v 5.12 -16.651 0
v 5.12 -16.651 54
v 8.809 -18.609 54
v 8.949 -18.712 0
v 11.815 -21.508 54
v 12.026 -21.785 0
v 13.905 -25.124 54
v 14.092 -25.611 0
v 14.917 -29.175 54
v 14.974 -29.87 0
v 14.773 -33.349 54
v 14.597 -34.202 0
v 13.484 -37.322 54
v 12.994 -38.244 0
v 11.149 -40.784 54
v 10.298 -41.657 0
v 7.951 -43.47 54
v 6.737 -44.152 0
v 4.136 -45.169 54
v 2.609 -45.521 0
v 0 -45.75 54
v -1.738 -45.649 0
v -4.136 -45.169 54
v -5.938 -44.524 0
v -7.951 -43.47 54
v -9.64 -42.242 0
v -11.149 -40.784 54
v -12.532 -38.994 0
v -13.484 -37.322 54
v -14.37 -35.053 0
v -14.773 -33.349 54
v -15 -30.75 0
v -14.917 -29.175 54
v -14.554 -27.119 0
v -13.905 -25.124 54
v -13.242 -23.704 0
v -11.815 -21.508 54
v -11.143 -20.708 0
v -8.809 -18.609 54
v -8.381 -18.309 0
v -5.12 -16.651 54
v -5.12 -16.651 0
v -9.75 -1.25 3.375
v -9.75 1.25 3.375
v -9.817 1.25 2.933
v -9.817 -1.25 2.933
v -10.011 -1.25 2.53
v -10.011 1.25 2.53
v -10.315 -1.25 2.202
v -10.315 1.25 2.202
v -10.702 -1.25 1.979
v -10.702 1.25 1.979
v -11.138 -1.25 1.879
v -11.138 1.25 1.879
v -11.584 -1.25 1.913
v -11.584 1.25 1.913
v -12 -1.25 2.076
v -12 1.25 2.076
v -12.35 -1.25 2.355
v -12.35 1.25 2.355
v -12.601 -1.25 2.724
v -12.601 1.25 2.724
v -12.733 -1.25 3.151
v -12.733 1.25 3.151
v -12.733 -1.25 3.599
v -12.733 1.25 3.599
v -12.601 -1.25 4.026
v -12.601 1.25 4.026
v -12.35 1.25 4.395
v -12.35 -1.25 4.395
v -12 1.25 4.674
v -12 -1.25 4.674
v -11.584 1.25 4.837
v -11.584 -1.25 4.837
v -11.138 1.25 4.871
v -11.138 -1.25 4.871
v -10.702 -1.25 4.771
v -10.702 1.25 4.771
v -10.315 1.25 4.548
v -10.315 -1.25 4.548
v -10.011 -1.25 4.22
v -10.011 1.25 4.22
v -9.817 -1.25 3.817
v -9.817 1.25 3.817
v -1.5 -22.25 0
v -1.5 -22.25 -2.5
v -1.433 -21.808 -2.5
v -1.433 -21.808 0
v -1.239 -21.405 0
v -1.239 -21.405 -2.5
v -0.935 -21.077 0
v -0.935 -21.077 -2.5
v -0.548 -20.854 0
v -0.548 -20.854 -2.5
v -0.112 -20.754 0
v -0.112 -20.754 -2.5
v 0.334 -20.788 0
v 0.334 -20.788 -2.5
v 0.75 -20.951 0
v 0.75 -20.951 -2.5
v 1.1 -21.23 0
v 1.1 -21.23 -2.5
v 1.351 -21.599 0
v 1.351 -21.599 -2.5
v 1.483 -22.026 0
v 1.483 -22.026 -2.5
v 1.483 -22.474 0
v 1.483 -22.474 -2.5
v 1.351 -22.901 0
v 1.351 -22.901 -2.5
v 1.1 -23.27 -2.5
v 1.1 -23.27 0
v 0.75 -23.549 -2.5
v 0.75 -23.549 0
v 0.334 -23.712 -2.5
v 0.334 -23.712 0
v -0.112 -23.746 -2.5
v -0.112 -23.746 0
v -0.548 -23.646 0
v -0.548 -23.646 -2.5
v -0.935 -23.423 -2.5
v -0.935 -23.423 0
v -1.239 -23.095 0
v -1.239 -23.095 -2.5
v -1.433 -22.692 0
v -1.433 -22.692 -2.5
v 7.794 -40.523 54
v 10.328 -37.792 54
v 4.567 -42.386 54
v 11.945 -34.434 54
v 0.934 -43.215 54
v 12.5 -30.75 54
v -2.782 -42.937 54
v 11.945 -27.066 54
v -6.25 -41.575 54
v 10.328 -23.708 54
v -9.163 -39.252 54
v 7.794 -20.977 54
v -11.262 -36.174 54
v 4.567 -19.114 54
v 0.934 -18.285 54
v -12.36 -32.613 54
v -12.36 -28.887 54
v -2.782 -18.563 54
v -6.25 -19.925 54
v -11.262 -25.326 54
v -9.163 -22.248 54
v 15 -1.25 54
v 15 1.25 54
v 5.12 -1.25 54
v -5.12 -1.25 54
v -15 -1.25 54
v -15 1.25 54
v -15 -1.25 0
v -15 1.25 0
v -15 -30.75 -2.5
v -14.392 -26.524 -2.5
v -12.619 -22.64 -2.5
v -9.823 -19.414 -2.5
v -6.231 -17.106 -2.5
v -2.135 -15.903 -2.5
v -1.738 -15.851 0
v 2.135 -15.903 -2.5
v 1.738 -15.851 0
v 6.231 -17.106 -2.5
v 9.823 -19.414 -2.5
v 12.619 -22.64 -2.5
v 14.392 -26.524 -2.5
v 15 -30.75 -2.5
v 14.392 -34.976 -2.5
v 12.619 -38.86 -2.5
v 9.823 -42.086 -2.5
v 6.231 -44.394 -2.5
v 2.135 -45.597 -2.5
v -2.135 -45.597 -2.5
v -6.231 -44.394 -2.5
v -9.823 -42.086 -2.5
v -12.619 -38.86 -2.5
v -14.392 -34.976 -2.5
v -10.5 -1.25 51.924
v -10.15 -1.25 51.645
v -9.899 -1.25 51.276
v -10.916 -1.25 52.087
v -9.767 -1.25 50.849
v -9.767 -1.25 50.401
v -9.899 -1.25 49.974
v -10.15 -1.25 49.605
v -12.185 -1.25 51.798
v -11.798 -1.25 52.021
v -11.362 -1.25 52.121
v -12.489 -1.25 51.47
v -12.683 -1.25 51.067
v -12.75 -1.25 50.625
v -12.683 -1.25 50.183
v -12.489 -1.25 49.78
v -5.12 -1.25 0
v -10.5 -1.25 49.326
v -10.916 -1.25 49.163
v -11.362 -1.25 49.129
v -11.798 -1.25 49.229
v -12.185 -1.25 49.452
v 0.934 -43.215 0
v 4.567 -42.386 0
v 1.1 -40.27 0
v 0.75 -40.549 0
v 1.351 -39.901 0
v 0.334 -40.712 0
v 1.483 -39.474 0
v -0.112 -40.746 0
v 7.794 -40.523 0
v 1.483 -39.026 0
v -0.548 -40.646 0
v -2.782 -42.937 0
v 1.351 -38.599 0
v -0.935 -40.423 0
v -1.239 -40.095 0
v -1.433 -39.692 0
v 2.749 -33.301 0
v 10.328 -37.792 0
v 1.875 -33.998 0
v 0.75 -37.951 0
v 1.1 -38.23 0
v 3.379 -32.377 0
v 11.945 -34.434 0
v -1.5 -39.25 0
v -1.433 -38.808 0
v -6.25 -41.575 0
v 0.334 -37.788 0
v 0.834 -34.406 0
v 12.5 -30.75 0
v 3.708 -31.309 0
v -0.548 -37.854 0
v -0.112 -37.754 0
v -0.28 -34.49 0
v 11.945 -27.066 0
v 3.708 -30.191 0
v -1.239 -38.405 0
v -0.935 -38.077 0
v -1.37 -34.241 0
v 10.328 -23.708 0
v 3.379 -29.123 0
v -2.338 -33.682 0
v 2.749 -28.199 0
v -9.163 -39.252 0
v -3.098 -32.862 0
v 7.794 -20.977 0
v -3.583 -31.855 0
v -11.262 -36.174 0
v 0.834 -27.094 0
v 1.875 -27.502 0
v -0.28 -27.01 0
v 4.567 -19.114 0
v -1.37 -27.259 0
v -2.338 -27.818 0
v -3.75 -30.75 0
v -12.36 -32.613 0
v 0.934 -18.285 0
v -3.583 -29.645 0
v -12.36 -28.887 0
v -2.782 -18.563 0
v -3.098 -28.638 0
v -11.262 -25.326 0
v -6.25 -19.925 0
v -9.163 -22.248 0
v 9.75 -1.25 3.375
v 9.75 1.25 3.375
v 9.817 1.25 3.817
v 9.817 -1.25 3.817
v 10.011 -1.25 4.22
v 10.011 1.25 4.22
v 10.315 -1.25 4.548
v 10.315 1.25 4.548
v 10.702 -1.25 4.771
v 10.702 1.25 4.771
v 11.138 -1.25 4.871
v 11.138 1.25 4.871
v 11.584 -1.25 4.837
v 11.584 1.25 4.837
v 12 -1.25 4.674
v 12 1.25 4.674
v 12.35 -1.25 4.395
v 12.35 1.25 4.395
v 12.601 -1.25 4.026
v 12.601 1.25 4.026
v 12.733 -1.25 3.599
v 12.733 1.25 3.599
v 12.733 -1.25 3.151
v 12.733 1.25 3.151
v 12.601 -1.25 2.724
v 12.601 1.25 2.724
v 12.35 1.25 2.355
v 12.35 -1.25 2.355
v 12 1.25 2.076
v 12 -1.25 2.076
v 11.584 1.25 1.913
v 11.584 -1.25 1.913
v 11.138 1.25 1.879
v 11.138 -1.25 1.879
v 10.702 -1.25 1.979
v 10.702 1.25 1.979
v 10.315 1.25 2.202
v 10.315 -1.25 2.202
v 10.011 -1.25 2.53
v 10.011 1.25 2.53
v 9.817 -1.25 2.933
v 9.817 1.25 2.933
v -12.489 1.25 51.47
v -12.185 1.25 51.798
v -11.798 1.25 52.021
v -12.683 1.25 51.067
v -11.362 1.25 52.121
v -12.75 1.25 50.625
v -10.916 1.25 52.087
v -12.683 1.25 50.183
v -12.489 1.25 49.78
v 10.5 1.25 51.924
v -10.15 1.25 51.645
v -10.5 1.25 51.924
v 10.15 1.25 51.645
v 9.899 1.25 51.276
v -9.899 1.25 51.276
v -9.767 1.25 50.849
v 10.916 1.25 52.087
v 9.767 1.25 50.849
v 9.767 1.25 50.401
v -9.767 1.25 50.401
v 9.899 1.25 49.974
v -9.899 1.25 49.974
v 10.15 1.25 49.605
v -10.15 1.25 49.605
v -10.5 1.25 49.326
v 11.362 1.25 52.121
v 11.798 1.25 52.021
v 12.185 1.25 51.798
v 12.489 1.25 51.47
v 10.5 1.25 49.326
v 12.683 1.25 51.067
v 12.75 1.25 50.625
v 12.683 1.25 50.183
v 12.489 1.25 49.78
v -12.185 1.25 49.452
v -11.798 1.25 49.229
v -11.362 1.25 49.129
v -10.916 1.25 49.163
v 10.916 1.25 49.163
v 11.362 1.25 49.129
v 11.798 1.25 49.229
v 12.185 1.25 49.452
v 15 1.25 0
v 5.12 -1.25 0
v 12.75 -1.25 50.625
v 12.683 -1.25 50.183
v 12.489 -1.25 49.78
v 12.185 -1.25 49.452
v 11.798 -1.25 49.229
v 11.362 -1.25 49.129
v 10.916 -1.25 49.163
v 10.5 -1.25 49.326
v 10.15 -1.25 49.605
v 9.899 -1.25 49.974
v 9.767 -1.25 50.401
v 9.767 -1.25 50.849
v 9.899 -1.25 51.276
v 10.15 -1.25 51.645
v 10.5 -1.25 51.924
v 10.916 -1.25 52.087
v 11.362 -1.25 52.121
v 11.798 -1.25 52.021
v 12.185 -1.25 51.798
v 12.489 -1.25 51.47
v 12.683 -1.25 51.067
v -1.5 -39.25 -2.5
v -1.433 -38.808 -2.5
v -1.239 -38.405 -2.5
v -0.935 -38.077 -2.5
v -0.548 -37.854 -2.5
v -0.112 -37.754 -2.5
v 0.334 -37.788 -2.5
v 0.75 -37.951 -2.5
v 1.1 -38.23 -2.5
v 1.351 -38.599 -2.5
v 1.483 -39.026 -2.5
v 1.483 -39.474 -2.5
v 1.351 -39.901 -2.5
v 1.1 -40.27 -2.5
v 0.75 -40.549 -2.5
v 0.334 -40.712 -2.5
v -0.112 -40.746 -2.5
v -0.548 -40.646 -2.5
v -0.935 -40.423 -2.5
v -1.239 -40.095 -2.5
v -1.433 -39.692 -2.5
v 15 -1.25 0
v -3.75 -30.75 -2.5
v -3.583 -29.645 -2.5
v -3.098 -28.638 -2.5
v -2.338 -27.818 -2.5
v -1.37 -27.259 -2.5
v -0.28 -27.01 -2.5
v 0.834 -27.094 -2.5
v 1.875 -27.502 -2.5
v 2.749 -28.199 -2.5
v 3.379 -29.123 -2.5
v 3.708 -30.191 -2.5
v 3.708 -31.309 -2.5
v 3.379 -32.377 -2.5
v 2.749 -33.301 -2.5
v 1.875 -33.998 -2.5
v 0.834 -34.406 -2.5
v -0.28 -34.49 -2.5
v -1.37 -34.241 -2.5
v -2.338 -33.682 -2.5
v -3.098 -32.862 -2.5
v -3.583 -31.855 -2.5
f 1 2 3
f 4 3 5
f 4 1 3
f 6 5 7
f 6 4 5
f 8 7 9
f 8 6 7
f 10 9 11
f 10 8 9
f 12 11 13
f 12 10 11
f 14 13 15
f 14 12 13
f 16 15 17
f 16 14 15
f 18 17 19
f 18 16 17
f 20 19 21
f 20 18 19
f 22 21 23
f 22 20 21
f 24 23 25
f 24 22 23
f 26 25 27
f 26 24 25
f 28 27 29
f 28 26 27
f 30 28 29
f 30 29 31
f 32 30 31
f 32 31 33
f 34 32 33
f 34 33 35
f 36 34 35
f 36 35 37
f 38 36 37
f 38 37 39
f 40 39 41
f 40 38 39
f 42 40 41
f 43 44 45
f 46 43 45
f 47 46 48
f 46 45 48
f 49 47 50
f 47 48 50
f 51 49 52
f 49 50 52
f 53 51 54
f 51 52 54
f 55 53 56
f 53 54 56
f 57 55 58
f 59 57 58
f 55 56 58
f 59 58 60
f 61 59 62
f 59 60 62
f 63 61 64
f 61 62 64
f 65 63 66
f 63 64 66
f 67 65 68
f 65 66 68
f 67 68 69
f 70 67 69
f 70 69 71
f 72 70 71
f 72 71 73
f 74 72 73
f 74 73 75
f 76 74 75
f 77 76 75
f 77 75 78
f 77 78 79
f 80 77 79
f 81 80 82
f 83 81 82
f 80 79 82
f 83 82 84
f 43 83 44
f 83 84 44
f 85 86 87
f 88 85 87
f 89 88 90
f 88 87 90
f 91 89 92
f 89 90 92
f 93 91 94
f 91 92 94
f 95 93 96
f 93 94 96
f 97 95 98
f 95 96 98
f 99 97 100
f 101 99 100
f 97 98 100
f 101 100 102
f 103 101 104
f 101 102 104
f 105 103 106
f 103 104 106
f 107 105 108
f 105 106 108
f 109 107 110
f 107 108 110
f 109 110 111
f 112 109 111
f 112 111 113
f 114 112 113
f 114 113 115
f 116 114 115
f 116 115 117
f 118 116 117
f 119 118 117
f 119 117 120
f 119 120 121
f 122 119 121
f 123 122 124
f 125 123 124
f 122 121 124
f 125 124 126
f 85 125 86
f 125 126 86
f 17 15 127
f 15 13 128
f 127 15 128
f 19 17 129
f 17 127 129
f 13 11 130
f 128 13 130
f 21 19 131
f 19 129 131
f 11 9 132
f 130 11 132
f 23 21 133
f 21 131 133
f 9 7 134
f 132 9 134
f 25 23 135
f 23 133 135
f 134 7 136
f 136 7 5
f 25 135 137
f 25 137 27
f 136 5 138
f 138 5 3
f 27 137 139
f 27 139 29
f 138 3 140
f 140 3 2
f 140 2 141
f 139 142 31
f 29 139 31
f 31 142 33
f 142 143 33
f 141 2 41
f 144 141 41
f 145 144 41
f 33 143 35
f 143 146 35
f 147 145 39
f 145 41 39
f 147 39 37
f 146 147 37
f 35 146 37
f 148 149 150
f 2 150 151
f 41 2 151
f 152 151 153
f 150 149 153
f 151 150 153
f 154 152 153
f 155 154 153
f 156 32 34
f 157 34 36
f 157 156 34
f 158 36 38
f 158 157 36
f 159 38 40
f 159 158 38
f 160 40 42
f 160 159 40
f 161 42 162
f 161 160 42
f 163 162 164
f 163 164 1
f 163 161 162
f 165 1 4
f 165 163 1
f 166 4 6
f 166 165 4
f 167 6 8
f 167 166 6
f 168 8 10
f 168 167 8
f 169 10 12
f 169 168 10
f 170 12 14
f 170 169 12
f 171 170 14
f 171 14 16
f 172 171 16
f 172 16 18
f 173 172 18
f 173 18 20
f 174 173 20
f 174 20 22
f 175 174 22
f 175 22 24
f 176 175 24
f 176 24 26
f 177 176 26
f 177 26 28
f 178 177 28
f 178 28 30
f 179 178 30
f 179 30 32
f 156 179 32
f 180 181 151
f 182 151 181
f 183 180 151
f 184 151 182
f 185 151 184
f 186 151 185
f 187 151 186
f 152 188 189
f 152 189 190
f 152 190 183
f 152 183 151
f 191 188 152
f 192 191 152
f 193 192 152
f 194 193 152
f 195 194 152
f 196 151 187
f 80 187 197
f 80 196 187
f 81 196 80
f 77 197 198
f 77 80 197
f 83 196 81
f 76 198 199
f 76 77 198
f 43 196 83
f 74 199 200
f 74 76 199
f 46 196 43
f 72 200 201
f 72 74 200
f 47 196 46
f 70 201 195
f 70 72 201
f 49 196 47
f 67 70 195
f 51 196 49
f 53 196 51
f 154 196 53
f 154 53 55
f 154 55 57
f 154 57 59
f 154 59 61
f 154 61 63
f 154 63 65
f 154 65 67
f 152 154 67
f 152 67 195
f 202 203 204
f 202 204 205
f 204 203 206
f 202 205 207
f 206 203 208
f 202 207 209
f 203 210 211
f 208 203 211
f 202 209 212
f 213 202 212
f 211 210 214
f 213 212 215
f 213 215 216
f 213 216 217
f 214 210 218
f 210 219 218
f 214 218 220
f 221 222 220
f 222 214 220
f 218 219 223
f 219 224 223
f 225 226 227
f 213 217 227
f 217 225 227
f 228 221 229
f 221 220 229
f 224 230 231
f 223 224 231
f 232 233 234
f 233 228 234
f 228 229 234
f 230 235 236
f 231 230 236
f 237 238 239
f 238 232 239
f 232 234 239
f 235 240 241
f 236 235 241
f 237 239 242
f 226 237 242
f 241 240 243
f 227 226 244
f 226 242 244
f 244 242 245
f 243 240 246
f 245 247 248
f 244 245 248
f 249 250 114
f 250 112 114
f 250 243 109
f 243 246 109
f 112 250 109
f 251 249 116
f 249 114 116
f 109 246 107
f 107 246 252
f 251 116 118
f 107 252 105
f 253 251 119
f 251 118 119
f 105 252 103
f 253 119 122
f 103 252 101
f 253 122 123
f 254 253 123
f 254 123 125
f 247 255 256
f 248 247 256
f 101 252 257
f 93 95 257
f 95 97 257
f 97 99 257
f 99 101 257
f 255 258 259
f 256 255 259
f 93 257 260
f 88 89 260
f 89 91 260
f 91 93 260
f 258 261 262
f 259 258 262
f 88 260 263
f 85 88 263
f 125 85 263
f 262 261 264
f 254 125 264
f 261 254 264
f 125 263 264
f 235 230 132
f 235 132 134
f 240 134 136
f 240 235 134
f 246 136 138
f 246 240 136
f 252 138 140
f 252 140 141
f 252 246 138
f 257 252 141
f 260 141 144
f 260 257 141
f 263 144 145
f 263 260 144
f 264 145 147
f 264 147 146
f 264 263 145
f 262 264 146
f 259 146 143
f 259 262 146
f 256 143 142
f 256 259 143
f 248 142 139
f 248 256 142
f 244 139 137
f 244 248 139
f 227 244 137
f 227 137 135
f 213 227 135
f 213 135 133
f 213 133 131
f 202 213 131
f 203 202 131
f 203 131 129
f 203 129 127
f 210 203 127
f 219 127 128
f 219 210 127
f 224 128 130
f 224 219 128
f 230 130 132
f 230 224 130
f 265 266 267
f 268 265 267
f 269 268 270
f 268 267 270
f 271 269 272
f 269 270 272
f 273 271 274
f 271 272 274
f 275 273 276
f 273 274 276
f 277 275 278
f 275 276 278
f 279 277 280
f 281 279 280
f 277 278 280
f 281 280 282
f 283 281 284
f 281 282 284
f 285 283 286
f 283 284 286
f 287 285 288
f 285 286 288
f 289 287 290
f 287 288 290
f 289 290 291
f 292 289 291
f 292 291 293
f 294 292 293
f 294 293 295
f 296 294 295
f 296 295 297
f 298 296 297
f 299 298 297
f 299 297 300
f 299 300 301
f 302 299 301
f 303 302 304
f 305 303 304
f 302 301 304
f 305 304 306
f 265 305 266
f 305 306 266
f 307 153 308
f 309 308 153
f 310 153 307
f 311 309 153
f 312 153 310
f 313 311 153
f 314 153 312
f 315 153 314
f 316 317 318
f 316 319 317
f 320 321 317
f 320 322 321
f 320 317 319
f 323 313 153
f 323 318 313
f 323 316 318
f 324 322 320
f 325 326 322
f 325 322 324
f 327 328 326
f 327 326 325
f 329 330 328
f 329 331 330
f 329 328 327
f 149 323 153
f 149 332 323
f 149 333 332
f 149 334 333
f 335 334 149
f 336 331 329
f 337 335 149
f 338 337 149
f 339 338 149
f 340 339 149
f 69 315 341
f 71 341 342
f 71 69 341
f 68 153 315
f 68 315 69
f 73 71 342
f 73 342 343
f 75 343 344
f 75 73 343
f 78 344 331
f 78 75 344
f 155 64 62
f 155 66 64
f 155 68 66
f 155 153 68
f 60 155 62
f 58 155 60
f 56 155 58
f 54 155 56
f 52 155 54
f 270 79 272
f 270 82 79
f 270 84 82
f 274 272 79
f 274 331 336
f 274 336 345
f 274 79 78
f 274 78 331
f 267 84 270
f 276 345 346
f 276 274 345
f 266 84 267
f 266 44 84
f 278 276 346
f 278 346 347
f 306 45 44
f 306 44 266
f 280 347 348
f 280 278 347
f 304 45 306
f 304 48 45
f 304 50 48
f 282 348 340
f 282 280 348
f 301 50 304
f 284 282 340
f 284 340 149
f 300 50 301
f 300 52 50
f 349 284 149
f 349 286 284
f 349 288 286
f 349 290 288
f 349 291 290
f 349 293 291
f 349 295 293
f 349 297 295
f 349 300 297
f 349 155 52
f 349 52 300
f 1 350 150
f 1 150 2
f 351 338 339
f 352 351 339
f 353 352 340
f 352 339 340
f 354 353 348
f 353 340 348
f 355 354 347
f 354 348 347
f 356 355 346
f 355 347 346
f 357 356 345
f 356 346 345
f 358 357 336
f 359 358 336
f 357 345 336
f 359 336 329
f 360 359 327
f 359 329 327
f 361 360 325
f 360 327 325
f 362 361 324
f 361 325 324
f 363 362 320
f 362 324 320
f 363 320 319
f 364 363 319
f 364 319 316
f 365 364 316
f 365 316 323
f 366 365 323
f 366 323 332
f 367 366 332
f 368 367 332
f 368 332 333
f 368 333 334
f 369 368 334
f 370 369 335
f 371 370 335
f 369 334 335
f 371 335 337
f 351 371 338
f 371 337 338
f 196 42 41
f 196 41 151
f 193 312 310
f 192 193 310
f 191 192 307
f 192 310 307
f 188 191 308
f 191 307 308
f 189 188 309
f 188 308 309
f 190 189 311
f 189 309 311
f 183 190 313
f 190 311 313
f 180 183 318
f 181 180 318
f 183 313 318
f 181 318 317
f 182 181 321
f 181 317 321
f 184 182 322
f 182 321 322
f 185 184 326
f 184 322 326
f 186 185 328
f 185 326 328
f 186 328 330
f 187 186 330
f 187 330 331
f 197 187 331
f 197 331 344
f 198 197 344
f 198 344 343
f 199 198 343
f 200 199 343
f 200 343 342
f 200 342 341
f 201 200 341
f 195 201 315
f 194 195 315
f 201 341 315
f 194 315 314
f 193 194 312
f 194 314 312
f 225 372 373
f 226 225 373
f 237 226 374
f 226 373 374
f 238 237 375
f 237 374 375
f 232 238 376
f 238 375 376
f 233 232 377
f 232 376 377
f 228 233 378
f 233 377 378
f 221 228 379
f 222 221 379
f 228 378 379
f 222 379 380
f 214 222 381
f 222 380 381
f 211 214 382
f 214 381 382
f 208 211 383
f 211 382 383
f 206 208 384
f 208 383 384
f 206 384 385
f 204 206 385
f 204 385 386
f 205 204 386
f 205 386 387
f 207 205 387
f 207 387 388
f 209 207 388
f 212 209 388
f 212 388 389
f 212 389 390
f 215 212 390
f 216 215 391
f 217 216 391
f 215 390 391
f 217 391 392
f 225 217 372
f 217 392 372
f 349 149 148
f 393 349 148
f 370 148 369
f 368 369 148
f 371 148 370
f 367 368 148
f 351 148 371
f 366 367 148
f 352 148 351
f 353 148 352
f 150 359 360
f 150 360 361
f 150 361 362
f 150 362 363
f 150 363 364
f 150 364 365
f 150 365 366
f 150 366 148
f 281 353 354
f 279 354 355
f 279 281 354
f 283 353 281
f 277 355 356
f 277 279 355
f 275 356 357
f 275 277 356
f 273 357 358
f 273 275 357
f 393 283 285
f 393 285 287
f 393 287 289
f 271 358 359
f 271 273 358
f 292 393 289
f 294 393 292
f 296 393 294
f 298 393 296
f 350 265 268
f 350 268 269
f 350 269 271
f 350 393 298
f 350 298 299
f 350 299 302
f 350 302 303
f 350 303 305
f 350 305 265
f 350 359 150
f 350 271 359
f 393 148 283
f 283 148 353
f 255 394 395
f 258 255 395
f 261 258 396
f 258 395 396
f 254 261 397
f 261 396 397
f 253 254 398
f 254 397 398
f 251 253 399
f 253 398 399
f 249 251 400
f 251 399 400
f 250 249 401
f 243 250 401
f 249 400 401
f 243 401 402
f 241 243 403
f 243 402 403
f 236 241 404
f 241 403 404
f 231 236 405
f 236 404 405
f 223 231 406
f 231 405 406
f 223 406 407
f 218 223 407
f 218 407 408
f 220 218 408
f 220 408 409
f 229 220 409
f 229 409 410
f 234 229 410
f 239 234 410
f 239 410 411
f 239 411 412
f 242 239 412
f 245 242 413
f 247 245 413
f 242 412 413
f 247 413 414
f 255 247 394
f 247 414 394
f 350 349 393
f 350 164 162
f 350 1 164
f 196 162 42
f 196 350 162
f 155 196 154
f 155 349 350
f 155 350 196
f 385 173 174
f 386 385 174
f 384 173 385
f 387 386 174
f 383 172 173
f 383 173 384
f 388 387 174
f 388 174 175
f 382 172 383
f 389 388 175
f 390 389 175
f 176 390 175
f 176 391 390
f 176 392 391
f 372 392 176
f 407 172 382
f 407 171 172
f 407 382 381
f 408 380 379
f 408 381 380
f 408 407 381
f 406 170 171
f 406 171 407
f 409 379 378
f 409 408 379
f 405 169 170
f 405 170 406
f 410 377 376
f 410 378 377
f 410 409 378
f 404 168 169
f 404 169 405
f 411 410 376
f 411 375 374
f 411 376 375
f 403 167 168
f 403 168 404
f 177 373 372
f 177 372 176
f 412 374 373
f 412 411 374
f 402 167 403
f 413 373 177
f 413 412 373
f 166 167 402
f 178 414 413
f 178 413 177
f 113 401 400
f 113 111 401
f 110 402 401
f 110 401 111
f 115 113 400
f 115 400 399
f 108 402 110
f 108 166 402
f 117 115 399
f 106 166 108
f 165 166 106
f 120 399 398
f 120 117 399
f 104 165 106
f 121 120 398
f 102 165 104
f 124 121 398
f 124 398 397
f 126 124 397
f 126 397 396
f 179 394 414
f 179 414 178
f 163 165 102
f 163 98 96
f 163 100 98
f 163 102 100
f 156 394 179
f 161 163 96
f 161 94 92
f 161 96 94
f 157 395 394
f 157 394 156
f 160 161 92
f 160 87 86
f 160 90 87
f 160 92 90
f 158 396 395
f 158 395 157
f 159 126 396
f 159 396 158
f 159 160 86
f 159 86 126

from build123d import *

# Parameters (mm, degrees)
CROQUIS1_R              = 12.5
SALIENTE_EXTRUIR1_DEPTH = 54
SALIENTE_EXTRUIR2_START = 2.5
CROQUIS2_R              = 15
SALIENTE_EXTRUIR2_DEPTH = 2.5
CROQUIS3_R              = 3.75
CORTAR_EXTRUIR2_DEPTH   = 2.5
CROQUIS5_R              = 1.5
CORTAR_EXTRUIR3_DEPTH   = 2.5
CROQUIS9_R              = 1.5
CORTAR_EXTRUIR5_DEPTH   = 2.5


with BuildPart() as part:
    # Croquis1 → Saliente-Extruir1 (new body)
    with BuildSketch(Plane.XY):
        with BuildLine():
            Line((-5.119897429, -1.25), (-15, -1.25))
            Line((-15, -1.25), (-15, 1.25))
            Line((-15, 1.25), (15, 1.25))
            Line((15, 1.25), (15, -1.25))
            Line((15, -1.25), (5.119897429, -1.25))
            Line((5.119897429, -1.25), (5.119897429, -13.25))
            Line((5.119897429, -13.25), (5.119897429, -16.650828027))
            ThreePointArc((5.119897429, -16.650828027), (0, -45.75), (-5.119897429, -16.650828027))
            Line((-5.119897429, -16.650828027), (-5.119897429, -13.25))
            Line((-5.119897429, -13.25), (-5.119897429, -1.25))
        make_face()
        with Locations((0, -30.75)):
            Circle(CROQUIS1_R, mode=Mode.SUBTRACT)
    extrude(amount=SALIENTE_EXTRUIR1_DEPTH)

    # Croquis2 → Saliente-Extruir2 (add)
    with BuildSketch(Plane(origin=(0, 0, 0), x_dir=(-1, 0, 0), z_dir=(0, 0, -1)).offset(SALIENTE_EXTRUIR2_START)):
        with Locations((0, -30.75)):
            Circle(CROQUIS2_R)
    extrude(amount=-SALIENTE_EXTRUIR2_DEPTH)

    # Croquis3 → Cortar-Extruir2 (cut)
    with BuildSketch(Plane(origin=(0, 0, -2.5), x_dir=(-1, 0, 0), z_dir=(0, 0, -1))):
        with Locations((0, -30.75)):
            Circle(CROQUIS3_R)
    extrude(amount=-CORTAR_EXTRUIR2_DEPTH, mode=Mode.SUBTRACT)

    # Croquis5 → Cortar-Extruir3 (cut)
    with BuildSketch(Plane(origin=(0, 0, -2.5), x_dir=(-1, 0, 0), z_dir=(0, 0, -1))):
        with Locations((0, -22.25)):
            Circle(CROQUIS5_R)
        with Locations((0, -39.25)):
            Circle(CROQUIS5_R)
    extrude(amount=-CORTAR_EXTRUIR3_DEPTH, mode=Mode.SUBTRACT)

    # Croquis9 → Cortar-Extruir5 (cut)
    with BuildSketch(Plane(origin=(0, 1.25, 0), x_dir=(1, 0, 0), z_dir=(0, 1, 0))):
        with Locations((-11.25, -50.625)):
            Circle(CROQUIS9_R)
        with Locations((-11.25, -3.375)):
            Circle(CROQUIS9_R)
        with Locations((11.25, -50.625)):
            Circle(CROQUIS9_R)
        with Locations((11.25, -3.375)):
            Circle(CROQUIS9_R)
    extrude(amount=-CORTAR_EXTRUIR5_DEPTH, mode=Mode.SUBTRACT)


solid = part.part
